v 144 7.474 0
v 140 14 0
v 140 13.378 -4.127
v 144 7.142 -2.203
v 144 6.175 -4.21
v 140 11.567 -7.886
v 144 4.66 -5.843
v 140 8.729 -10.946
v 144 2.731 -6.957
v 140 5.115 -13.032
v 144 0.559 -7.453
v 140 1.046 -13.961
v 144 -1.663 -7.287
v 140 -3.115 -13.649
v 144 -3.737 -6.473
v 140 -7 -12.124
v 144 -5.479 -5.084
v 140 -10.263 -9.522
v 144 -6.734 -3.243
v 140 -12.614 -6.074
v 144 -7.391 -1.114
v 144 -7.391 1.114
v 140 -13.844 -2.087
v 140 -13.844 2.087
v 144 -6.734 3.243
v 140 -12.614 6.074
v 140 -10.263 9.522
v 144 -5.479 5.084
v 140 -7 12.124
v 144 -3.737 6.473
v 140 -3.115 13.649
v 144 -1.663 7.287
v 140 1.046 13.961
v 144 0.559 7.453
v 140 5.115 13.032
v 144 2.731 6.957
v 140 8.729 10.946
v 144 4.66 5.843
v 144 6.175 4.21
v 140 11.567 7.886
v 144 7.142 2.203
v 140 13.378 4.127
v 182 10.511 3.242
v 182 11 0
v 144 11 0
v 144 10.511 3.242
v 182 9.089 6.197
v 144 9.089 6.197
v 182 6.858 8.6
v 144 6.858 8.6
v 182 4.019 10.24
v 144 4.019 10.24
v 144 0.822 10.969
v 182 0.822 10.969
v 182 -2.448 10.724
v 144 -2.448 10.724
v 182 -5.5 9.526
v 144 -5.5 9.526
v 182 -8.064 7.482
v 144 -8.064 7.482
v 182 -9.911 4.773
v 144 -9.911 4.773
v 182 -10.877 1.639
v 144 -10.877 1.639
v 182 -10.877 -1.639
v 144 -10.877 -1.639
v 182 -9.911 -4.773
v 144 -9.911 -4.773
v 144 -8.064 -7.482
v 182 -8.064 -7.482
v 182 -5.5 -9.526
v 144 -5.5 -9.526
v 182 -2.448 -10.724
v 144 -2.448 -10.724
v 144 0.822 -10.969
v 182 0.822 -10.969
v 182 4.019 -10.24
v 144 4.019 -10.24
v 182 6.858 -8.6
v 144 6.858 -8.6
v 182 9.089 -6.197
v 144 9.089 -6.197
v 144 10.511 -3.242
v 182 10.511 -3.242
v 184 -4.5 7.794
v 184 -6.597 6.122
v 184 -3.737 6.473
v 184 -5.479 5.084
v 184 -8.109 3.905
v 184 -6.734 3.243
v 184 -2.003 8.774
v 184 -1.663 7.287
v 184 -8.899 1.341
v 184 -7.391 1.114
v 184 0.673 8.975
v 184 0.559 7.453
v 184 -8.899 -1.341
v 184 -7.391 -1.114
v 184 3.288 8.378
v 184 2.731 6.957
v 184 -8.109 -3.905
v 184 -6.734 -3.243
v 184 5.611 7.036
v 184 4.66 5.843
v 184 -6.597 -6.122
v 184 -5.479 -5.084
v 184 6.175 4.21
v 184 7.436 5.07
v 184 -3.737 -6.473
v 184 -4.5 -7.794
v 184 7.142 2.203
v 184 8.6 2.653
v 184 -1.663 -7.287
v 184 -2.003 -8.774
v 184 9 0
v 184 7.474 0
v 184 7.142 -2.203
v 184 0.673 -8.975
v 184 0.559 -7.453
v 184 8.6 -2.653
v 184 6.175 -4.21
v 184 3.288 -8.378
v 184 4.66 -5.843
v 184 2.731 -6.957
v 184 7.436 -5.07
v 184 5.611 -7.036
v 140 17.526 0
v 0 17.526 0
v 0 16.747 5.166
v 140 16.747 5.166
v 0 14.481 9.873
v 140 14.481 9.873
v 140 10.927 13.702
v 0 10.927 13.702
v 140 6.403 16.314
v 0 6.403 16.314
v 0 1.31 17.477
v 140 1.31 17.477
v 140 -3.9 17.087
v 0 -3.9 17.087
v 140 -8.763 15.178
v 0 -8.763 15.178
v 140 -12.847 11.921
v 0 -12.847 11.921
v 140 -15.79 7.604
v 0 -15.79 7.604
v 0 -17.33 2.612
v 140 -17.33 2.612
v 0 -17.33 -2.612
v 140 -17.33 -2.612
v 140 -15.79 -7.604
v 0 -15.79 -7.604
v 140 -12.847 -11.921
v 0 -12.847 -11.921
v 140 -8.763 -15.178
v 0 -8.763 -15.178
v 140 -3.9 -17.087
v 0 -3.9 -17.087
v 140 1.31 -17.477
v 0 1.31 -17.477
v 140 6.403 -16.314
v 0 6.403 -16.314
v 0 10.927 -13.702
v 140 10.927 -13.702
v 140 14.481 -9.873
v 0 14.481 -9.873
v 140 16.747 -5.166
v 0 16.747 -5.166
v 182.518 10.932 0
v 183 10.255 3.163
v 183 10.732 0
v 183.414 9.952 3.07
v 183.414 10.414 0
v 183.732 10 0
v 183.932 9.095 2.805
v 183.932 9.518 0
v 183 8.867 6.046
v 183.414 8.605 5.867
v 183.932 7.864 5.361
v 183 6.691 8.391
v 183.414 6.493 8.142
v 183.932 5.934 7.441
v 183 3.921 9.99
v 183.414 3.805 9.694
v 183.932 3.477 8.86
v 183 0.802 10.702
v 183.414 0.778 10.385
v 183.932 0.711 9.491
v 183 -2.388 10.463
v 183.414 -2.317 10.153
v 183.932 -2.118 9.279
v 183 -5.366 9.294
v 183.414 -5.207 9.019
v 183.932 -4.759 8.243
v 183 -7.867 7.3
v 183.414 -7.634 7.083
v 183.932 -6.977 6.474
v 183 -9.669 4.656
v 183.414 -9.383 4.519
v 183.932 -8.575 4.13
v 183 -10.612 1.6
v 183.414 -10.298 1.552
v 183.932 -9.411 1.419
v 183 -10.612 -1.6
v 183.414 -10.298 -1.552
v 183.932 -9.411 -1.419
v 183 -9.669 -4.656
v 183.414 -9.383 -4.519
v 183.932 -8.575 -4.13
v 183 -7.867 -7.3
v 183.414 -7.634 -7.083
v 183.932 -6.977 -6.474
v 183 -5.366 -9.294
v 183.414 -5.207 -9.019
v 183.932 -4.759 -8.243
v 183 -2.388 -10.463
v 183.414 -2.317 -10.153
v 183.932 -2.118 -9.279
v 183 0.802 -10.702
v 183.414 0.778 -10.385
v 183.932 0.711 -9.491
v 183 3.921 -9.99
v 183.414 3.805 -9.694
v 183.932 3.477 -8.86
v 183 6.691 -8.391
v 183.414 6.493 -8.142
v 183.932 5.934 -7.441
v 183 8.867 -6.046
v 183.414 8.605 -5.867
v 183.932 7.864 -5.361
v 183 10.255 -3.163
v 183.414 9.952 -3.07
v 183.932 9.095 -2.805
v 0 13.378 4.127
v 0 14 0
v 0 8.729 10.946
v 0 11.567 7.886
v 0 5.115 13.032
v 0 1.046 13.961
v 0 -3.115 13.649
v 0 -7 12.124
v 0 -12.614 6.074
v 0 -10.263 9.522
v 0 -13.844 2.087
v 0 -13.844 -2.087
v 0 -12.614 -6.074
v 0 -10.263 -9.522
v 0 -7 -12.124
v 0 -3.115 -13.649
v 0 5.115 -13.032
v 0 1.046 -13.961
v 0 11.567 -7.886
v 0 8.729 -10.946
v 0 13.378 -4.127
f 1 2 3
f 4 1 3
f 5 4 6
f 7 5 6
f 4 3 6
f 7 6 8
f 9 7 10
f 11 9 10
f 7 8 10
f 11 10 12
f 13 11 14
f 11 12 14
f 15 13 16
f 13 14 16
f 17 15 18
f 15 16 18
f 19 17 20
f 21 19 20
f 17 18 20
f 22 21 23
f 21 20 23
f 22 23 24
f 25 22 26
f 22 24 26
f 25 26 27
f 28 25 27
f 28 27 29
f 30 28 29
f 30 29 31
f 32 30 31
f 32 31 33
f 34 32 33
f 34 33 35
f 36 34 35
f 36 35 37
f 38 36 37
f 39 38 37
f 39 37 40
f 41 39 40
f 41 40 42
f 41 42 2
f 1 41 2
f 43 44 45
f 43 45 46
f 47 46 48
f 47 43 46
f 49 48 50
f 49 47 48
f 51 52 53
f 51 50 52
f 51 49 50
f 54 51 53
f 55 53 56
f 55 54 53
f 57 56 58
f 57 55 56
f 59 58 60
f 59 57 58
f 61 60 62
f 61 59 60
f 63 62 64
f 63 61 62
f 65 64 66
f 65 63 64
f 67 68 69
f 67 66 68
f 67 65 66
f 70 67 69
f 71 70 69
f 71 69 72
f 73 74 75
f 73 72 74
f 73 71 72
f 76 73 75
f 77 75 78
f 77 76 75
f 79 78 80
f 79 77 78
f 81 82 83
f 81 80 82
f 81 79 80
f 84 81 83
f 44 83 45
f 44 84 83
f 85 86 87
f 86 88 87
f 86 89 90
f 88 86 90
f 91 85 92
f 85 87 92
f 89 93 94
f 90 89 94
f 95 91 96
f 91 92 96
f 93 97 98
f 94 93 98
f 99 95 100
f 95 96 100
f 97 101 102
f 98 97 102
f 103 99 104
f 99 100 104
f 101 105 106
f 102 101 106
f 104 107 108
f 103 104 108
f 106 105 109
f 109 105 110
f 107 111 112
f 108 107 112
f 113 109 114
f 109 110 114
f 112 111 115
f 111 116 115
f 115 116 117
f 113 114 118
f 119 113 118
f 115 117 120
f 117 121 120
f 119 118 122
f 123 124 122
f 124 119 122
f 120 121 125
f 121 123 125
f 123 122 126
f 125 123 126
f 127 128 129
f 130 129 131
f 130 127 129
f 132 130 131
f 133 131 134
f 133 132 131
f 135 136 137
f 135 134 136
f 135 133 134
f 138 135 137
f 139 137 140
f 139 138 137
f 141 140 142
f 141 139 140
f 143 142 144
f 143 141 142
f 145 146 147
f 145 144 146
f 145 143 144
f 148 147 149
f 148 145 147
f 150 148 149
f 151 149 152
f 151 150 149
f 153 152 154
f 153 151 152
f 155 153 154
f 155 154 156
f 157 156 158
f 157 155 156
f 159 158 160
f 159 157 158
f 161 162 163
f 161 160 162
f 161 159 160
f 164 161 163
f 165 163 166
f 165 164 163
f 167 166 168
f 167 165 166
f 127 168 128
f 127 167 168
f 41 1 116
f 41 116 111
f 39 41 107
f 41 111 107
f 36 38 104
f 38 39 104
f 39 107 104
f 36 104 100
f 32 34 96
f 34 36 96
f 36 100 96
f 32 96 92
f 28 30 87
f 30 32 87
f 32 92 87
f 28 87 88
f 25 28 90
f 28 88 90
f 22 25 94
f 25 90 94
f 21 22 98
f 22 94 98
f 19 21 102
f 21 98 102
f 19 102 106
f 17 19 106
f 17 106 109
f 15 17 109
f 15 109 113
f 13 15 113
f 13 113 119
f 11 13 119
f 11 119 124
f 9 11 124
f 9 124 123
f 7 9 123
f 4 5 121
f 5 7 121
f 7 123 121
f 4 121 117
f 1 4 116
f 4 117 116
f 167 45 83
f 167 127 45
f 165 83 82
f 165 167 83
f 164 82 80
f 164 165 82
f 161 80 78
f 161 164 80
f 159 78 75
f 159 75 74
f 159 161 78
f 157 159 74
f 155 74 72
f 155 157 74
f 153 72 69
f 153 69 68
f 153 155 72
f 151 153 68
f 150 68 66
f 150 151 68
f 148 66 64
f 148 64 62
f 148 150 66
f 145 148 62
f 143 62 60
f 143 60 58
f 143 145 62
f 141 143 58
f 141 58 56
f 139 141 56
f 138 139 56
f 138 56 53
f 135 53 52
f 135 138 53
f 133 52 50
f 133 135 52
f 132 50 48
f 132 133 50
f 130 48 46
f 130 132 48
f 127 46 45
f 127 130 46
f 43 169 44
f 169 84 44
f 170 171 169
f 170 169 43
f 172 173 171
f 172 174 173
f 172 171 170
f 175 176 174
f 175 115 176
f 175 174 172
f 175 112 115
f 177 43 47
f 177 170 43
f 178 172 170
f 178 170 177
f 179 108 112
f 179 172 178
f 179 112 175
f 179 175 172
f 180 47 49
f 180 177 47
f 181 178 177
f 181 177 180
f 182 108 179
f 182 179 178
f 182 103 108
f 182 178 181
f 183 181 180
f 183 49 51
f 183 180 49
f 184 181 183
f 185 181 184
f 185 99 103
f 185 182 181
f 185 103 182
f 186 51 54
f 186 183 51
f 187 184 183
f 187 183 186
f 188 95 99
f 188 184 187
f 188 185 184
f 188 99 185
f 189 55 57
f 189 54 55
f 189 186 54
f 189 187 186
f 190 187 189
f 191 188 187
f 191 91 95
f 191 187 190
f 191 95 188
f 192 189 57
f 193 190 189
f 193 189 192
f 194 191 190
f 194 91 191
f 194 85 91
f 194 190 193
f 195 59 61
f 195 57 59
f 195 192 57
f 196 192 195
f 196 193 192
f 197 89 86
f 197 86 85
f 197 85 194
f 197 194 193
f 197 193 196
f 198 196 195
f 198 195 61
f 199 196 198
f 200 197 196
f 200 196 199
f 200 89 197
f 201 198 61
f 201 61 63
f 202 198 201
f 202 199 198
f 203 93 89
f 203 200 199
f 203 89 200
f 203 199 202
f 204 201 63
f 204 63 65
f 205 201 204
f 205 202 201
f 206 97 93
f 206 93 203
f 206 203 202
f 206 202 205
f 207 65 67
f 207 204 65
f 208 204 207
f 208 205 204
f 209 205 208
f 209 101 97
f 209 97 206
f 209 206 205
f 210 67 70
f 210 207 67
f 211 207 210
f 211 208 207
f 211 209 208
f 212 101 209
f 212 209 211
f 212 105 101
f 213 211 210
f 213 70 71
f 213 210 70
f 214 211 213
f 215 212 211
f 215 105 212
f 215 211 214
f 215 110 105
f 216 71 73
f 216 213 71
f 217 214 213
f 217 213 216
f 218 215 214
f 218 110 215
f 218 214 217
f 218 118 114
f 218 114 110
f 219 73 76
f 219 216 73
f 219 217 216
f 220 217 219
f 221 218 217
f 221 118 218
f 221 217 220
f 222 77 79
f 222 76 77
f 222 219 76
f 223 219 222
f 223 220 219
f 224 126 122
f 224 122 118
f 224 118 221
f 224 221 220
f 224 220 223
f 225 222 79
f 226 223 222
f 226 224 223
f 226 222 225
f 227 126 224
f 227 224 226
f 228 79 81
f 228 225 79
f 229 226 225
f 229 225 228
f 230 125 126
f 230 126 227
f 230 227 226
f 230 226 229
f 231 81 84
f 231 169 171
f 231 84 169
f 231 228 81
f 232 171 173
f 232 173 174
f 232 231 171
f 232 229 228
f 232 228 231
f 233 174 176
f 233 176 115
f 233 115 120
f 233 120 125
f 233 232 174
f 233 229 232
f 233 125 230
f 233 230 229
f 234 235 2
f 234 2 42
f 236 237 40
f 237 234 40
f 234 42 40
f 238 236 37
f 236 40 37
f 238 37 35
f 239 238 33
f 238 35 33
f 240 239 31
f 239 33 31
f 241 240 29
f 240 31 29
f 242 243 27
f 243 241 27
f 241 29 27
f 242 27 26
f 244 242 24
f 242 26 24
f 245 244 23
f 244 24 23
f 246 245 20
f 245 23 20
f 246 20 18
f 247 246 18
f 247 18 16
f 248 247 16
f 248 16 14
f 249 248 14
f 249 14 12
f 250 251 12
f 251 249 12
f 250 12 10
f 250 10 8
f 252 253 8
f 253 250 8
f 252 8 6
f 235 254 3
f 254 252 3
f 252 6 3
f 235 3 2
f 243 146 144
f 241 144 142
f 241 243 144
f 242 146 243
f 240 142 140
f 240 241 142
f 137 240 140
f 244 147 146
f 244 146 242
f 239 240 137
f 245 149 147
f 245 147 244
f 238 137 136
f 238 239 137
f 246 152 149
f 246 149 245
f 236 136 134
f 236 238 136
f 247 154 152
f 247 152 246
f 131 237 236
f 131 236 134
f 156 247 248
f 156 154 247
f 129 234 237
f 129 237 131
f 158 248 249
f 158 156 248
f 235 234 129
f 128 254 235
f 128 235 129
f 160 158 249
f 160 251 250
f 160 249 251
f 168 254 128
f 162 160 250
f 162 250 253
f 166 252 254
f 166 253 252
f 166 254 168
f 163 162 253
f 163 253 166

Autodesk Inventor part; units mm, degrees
ref_plane "YZ Plane" through (0, 0, 0) normal (1, 0, 0) x (0, 1, 0)
ref_plane "XZ Plane" through (0, 0, 0) normal (0, 1, 0) x (-1, 0, 0)
ref_plane "XY Plane" through (0, 0, 0) normal (0, 0, 1) x (1, 0, 0)
sketch "Boceto1" plane through (0, 0, 0) normal (0, 0, 1) x (1, 0, 0)
  line L0 (0, 0) -> (0, 17.526)
  line L1 (0, 17.526) -> (140, 17.526)
  line L2 (140, 17.526) -> (144, 11)
  line L3 (144, 11) -> (184, 11)
  line L4 (184, 11) -> (184, 0)
  line L5 (144, 7.474) -> (184, 7.474)
  line L6 (184, 0) -> (0, 0)
  line L7 (0, 17.526) -> (0, 14)
  line L8 (0, 14) -> (140, 14)
  line L9 (144, 7.474) -> (140, 14)
  point P0 (0, 11.6562)
  dimension "d5" = 140
  dimension "d9" = 40
  dimension "d13" = 17.526
  dimension "d14" = 14
revolve "Revolución2" add sketch "Boceto1" angle 360 about axis through (184, 0, 0) along (-1, 0, 0) contours L0 L1 L2 L3 L4 L5 L9 L8
fillet "Empalme2" radius 2 1 edges at (184, -11, 0)
equation "\"d13\" = 0.5 * DintTub"
equation "\"d14\" = 0.5 * DIntTubTen"
equation "\"DintTub\" = 35.052"
equation "\"DIntTubTen\" = 28"
properties material "Acero"
